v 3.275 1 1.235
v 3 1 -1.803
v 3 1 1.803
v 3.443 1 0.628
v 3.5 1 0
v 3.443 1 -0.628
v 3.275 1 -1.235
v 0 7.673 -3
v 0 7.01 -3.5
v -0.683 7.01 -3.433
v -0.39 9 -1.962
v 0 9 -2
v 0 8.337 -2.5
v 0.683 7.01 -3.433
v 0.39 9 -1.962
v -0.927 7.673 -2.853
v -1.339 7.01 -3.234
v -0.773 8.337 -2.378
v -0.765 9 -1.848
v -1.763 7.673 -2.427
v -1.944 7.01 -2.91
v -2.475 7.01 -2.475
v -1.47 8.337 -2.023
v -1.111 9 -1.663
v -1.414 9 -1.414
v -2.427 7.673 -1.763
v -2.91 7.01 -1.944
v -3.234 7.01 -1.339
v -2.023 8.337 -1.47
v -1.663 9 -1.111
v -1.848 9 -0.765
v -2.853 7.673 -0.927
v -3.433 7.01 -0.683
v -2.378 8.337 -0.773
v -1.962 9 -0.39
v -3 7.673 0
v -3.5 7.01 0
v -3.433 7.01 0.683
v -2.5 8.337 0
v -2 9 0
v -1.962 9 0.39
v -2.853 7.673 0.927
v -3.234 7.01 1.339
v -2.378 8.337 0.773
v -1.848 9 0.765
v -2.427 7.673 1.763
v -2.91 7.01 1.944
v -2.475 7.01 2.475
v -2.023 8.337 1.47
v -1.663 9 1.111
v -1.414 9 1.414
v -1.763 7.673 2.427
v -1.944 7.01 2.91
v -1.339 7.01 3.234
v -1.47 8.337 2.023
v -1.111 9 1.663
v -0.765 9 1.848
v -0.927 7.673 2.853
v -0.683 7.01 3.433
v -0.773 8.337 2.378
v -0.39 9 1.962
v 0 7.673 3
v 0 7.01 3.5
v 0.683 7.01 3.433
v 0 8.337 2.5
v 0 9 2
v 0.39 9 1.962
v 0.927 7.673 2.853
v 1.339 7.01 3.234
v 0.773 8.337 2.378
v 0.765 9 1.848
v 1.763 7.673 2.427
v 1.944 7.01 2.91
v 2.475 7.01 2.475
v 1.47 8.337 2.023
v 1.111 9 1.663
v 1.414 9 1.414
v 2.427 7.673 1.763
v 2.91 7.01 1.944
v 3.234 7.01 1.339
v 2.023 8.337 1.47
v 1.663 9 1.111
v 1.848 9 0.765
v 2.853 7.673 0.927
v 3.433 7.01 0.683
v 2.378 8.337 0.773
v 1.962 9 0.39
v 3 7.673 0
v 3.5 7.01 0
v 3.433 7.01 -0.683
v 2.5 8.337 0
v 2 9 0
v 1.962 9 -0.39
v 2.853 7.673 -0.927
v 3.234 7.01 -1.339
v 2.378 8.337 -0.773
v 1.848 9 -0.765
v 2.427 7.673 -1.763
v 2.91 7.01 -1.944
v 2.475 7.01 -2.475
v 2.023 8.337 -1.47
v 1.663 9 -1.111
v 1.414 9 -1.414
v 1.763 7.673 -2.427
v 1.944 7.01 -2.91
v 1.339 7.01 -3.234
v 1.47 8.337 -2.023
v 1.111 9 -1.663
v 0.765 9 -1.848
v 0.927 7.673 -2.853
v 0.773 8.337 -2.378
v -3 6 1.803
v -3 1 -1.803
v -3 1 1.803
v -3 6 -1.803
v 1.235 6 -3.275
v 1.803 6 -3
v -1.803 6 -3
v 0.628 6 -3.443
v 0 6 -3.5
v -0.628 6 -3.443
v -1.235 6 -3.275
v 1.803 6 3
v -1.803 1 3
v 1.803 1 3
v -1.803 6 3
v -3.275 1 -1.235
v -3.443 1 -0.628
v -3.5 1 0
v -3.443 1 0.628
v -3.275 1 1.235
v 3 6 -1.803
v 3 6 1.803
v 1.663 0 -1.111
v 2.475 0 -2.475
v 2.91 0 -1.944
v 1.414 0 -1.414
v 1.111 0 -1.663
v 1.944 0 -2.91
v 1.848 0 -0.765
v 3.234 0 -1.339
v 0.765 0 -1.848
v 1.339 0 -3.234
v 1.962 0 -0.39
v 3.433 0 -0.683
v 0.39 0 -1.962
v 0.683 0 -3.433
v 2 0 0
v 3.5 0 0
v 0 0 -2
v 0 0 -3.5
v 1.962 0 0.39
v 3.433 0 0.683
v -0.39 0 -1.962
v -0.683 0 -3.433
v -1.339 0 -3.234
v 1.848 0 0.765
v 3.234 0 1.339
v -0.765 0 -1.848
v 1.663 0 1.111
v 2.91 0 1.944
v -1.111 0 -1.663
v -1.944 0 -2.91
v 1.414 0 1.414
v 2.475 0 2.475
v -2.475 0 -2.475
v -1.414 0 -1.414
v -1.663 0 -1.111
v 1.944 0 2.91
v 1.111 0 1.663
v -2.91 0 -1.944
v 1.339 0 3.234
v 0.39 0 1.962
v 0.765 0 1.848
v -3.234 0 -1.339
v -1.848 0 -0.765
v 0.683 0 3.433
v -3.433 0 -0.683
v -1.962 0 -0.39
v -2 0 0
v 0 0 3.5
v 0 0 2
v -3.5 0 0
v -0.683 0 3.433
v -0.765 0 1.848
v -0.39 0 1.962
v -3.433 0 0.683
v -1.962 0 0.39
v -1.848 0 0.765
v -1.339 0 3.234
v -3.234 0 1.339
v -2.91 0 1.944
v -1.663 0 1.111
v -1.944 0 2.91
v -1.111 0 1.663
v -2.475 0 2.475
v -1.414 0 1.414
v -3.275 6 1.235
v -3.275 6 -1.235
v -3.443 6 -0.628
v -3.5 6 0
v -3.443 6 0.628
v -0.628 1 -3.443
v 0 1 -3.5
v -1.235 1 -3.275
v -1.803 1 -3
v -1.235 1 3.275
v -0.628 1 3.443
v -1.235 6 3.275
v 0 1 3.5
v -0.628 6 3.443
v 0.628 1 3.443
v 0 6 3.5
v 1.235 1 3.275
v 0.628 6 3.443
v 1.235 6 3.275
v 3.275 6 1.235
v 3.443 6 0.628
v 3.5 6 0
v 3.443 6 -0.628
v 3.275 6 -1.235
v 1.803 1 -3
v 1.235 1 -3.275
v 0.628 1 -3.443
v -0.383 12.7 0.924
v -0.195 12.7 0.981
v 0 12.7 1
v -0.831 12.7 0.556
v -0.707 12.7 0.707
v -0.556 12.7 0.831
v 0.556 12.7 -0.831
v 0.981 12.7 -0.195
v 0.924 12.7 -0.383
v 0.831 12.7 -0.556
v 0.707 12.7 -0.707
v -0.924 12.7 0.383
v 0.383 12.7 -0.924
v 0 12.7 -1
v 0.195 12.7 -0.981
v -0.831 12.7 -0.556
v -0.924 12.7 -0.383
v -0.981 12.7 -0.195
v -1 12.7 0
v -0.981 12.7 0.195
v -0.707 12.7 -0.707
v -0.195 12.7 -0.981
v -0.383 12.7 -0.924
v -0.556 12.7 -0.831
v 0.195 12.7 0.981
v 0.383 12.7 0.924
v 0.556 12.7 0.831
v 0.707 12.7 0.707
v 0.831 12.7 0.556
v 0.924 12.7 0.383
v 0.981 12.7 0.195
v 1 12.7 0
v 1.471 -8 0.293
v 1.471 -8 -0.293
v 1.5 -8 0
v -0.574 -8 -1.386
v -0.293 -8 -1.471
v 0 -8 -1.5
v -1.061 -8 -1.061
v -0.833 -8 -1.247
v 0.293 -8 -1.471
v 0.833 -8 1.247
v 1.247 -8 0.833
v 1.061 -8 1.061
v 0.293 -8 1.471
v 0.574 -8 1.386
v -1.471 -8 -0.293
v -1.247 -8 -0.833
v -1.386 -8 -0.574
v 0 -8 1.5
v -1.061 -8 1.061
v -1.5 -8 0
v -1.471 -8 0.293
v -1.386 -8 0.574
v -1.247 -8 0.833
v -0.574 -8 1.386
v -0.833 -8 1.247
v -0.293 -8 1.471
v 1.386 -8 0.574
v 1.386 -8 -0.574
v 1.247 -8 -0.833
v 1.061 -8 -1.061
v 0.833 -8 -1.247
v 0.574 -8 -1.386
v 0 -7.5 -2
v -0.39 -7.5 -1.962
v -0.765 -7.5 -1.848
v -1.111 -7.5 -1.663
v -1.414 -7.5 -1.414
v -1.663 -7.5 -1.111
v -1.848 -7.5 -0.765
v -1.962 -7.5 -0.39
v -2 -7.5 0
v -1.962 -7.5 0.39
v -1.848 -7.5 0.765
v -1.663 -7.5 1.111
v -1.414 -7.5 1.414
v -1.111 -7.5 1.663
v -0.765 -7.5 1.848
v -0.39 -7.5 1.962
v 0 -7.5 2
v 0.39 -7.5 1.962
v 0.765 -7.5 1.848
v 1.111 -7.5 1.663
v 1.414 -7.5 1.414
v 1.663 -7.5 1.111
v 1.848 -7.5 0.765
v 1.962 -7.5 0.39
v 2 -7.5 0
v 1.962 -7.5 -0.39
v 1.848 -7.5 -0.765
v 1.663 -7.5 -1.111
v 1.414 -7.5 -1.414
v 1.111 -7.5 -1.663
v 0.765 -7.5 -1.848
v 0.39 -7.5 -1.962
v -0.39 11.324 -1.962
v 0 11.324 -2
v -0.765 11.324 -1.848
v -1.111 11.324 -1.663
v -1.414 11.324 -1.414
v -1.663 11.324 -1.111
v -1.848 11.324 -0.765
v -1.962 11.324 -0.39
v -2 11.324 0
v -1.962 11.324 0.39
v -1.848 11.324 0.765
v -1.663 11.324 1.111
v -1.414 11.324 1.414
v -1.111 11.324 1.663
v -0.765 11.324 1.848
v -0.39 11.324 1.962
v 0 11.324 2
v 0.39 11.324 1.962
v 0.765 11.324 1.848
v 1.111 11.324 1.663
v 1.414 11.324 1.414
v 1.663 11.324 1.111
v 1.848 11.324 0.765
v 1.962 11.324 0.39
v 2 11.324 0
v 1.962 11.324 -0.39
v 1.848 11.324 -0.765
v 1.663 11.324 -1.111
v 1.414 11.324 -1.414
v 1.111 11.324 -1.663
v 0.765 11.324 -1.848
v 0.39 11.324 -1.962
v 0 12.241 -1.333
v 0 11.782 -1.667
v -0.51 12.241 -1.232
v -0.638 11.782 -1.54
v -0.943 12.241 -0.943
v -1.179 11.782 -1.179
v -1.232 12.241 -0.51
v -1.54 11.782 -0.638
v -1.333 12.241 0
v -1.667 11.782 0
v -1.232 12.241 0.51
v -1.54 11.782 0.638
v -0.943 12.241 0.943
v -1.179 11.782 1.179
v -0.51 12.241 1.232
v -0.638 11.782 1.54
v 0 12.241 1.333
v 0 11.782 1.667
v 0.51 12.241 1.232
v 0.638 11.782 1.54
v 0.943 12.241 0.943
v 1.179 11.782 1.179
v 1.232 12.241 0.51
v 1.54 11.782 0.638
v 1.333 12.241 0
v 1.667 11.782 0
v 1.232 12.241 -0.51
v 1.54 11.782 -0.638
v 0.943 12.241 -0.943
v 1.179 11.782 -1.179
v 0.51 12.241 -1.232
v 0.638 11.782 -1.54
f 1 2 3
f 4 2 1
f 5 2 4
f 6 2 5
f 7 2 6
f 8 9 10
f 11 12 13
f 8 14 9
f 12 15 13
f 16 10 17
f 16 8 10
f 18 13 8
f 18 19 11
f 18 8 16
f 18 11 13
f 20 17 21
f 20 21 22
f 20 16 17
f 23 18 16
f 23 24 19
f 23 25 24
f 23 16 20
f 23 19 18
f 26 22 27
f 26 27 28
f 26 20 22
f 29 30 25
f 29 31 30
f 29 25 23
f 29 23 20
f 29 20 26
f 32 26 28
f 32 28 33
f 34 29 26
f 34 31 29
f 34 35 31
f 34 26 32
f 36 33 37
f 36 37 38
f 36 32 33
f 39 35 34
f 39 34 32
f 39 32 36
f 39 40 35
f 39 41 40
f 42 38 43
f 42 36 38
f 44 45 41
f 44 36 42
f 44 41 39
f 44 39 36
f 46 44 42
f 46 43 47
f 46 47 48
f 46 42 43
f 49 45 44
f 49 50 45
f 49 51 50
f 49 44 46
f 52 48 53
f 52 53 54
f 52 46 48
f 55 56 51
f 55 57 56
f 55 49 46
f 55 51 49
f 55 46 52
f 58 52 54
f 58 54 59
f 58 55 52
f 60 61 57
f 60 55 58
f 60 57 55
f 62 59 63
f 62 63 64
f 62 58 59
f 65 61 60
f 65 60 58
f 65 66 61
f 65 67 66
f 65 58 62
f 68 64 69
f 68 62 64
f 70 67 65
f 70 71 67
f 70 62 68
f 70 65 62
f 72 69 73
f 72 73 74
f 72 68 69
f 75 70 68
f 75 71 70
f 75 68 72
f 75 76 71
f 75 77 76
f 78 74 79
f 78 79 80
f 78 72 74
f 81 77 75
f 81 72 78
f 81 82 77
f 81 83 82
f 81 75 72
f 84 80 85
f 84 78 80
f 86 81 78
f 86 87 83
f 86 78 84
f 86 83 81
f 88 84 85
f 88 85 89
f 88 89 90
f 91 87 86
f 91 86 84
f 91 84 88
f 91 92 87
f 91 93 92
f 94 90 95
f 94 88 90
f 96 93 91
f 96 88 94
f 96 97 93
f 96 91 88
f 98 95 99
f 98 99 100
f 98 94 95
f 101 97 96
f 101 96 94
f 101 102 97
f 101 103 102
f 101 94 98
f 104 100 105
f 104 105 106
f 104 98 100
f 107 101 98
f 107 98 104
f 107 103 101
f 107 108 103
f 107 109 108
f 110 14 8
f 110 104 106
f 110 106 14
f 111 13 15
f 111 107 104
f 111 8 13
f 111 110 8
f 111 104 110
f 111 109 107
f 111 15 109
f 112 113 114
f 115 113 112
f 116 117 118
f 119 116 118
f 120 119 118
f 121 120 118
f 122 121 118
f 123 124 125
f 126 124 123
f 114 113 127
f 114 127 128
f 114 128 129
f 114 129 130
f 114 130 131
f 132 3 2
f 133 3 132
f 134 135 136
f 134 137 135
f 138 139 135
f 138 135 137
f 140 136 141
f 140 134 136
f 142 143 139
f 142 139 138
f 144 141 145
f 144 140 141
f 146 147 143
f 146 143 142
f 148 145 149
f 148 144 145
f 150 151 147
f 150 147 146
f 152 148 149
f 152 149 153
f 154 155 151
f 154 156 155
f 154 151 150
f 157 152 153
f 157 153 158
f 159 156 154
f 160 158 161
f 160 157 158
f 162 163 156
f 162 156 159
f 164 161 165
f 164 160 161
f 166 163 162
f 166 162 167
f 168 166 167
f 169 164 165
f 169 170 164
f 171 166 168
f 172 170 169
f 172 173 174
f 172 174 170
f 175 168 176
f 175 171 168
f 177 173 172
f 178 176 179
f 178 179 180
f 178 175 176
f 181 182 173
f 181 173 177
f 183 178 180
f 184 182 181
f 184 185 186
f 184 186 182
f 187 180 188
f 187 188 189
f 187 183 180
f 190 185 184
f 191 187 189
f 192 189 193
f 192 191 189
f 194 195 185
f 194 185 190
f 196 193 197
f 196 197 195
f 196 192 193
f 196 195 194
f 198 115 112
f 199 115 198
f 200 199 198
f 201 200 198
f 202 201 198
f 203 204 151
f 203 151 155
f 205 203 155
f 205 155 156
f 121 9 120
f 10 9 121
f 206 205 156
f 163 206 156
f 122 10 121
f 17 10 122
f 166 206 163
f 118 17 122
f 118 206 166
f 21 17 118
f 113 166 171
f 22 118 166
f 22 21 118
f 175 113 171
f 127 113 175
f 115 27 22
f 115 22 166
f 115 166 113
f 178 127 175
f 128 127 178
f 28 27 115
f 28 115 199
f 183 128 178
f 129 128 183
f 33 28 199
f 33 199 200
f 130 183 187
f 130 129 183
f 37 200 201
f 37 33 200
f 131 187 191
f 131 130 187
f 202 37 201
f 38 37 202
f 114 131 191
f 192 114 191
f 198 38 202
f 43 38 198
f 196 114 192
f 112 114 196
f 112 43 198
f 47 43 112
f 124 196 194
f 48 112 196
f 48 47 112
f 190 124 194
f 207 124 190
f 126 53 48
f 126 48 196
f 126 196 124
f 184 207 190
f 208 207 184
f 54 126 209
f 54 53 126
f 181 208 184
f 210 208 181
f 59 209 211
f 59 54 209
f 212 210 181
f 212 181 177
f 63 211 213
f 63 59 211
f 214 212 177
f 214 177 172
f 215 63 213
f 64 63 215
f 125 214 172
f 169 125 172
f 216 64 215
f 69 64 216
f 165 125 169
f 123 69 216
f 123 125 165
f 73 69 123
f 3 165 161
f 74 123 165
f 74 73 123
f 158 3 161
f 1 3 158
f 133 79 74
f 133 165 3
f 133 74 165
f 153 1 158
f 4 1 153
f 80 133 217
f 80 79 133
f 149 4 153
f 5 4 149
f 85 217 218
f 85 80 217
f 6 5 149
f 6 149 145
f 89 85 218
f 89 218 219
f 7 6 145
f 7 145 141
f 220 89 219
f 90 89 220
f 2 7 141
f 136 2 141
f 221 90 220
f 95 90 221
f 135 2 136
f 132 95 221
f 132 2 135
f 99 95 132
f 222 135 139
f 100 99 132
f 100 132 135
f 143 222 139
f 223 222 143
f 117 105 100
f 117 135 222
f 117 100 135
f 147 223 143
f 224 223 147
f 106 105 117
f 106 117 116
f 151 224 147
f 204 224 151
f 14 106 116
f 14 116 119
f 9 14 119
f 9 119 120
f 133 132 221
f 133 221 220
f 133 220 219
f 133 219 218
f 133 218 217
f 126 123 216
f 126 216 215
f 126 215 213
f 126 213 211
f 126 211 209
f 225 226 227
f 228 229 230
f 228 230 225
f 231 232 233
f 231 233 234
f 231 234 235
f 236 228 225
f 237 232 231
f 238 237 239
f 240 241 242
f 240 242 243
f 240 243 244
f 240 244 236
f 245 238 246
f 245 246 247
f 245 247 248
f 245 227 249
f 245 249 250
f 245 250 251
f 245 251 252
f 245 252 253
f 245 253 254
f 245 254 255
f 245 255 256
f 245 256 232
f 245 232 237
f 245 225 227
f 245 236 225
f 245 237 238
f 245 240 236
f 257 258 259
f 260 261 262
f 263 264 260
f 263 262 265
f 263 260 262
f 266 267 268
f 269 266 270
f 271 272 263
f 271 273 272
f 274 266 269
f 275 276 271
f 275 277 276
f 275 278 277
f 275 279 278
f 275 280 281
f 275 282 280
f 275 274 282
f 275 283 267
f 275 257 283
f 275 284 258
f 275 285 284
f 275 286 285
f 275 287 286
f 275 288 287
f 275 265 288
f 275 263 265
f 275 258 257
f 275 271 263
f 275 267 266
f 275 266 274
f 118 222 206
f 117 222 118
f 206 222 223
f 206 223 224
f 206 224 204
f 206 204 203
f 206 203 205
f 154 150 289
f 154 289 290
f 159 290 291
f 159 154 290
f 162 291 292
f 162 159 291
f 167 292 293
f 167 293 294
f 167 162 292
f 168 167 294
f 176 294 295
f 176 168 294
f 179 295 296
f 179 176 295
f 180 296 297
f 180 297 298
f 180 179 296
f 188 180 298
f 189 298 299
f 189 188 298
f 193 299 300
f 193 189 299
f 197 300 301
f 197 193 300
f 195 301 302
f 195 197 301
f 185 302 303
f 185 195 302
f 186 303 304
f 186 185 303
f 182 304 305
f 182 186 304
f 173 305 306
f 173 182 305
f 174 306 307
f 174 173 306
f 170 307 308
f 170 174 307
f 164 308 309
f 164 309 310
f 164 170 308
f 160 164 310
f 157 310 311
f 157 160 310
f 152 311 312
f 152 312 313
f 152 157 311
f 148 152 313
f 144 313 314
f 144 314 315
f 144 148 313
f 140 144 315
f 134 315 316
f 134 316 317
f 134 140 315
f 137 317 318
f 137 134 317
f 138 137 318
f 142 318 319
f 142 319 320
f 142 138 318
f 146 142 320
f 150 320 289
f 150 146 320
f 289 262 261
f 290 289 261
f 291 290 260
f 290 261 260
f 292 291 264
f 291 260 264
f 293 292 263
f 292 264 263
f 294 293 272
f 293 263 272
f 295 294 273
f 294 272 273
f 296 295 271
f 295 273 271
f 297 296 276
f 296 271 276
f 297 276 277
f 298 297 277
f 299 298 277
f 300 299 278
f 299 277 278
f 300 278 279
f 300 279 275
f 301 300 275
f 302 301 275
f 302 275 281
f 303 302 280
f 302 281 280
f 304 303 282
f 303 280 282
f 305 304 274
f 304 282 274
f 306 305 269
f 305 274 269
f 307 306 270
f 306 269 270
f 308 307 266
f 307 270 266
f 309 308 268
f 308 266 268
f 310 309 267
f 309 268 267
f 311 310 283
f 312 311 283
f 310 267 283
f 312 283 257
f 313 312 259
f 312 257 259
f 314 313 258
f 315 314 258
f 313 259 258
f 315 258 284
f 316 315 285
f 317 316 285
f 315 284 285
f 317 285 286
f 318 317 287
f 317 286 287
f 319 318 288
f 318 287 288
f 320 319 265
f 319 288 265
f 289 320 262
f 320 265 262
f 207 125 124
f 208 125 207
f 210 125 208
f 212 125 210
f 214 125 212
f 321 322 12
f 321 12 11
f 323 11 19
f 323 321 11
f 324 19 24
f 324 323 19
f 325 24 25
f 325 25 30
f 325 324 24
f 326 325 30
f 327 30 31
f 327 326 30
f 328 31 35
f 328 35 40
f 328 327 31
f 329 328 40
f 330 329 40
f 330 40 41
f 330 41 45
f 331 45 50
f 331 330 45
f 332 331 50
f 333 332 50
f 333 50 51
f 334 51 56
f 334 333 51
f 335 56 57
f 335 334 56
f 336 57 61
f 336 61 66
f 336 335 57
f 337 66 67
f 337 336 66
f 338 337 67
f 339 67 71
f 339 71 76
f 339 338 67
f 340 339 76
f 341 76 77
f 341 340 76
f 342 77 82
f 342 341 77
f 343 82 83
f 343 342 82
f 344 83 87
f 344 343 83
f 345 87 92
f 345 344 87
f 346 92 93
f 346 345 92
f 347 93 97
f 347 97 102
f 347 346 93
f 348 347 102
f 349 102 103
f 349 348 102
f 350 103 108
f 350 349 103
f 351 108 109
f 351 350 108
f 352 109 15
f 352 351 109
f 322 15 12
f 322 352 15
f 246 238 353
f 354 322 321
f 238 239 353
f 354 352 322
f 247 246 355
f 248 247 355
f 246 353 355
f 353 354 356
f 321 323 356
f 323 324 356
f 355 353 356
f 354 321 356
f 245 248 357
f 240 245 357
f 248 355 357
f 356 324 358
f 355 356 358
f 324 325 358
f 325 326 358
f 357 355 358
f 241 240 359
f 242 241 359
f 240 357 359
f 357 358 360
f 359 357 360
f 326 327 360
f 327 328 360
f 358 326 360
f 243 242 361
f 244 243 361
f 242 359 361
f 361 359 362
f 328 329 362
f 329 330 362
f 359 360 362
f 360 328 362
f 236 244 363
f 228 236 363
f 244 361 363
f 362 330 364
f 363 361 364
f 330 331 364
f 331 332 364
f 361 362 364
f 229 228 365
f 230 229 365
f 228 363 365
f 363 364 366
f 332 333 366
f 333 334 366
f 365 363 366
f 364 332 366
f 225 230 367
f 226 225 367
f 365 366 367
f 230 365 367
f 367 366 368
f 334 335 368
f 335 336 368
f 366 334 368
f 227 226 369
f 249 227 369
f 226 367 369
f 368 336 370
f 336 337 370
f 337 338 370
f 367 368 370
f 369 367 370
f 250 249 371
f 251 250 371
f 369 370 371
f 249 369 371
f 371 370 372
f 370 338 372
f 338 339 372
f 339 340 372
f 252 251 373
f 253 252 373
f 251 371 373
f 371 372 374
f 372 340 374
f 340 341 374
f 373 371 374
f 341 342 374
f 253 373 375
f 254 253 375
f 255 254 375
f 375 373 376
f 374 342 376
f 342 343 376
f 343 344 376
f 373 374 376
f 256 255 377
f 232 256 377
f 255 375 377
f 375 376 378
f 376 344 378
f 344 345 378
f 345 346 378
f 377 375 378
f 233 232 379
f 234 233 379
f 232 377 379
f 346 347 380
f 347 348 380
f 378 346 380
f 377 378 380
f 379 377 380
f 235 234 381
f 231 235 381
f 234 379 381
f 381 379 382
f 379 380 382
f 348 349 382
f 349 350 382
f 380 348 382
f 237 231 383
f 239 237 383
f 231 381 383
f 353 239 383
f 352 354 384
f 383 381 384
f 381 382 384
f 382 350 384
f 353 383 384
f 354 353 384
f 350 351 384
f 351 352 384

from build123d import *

# Parameters (mm, degrees)
SKETCH2_W          = 0.5
SKETCH2_H          = 5
CUT_EXTRUDE1_DEPTH = 14.630480549
CIRPATTERN1_COUNT  = 2
CIRPATTERN1_ANGLE  = 90
CHAMFER1_SIZE2     = 1.5
CHAMFER1_SIZE      = 1.990567232
CHAMFER2_SIZE      = 1
CHAMFER2_SIZE2     = 1.37638192
CHAMFER3_SIZE      = 0.5


with BuildPart() as part:
    # Sketch1 → Revolve1 (revolve)
    with BuildSketch(Plane.XY, mode=Mode.PRIVATE) as revolve1_sk:
        Polygon((0, -8), (2, -8), (2, 0), (3.5, 0), (3.5, 9), (2, 9), (2, 12.7), (0, 12.7), align=None)
    revolve(revolve1_sk.sketch.rotate(Axis((0, -11.082621068, 0), (0, 1, 0)), 90), axis=Axis((0, -11.082621068, 0), (0, 1, 0)))

    # Sketch2 → Cut-Extrude1 (cut, symmetric)
    with BuildSketch(Plane.XY):
        with Locations((-3.25, 3.5)):
            Rectangle(SKETCH2_W, SKETCH2_H)
        with Locations((3.25, 3.5)):
            Rectangle(SKETCH2_W, SKETCH2_H)
    cut_extrude1 = extrude(amount=CUT_EXTRUDE1_DEPTH, both=True, mode=Mode.SUBTRACT)

    # CirPattern1: Cut-Extrude1 ×2 about axis
    cirpattern1_axis = Axis((0, -11.082621068, 0), (0, -1, 0))
    for i in range(1, CIRPATTERN1_COUNT):
        add(cut_extrude1.rotate(cirpattern1_axis, i * CIRPATTERN1_ANGLE / (CIRPATTERN1_COUNT - 1)), mode=Mode.SUBTRACT)

    # Chamfer1
    chamfer1_edges = [part.edges().sort_by_distance(p)[0] for p in [
        (0, 9, 3.5),
    ]]
    chamfer1_side = [part.faces().sort_by_distance(p)[0] for p in [
        (0, 8.97, 3.5),
    ]]
    chamfer(chamfer1_edges, length=CHAMFER1_SIZE - 0.0001, length2=CHAMFER1_SIZE2 - 0.0001, reference=chamfer1_side[0])  # a hair under: the kernel refuses the full size

    # Chamfer2
    chamfer2_edges = [part.edges().sort_by_distance(p)[0] for p in [
        (0, 12.7, 2),
    ]]
    chamfer2_side = [part.faces().sort_by_distance(p)[0] for p in [
        (0, 12.7, 0),
    ]]
    chamfer(chamfer2_edges, length=CHAMFER2_SIZE, length2=CHAMFER2_SIZE2, reference=chamfer2_side[0])

    # Chamfer3
    chamfer3_edges = [part.edges().sort_by_distance(p)[0] for p in [
        (0, -8, 2),
    ]]
    chamfer(chamfer3_edges, length=CHAMFER3_SIZE)


solid = part.part
